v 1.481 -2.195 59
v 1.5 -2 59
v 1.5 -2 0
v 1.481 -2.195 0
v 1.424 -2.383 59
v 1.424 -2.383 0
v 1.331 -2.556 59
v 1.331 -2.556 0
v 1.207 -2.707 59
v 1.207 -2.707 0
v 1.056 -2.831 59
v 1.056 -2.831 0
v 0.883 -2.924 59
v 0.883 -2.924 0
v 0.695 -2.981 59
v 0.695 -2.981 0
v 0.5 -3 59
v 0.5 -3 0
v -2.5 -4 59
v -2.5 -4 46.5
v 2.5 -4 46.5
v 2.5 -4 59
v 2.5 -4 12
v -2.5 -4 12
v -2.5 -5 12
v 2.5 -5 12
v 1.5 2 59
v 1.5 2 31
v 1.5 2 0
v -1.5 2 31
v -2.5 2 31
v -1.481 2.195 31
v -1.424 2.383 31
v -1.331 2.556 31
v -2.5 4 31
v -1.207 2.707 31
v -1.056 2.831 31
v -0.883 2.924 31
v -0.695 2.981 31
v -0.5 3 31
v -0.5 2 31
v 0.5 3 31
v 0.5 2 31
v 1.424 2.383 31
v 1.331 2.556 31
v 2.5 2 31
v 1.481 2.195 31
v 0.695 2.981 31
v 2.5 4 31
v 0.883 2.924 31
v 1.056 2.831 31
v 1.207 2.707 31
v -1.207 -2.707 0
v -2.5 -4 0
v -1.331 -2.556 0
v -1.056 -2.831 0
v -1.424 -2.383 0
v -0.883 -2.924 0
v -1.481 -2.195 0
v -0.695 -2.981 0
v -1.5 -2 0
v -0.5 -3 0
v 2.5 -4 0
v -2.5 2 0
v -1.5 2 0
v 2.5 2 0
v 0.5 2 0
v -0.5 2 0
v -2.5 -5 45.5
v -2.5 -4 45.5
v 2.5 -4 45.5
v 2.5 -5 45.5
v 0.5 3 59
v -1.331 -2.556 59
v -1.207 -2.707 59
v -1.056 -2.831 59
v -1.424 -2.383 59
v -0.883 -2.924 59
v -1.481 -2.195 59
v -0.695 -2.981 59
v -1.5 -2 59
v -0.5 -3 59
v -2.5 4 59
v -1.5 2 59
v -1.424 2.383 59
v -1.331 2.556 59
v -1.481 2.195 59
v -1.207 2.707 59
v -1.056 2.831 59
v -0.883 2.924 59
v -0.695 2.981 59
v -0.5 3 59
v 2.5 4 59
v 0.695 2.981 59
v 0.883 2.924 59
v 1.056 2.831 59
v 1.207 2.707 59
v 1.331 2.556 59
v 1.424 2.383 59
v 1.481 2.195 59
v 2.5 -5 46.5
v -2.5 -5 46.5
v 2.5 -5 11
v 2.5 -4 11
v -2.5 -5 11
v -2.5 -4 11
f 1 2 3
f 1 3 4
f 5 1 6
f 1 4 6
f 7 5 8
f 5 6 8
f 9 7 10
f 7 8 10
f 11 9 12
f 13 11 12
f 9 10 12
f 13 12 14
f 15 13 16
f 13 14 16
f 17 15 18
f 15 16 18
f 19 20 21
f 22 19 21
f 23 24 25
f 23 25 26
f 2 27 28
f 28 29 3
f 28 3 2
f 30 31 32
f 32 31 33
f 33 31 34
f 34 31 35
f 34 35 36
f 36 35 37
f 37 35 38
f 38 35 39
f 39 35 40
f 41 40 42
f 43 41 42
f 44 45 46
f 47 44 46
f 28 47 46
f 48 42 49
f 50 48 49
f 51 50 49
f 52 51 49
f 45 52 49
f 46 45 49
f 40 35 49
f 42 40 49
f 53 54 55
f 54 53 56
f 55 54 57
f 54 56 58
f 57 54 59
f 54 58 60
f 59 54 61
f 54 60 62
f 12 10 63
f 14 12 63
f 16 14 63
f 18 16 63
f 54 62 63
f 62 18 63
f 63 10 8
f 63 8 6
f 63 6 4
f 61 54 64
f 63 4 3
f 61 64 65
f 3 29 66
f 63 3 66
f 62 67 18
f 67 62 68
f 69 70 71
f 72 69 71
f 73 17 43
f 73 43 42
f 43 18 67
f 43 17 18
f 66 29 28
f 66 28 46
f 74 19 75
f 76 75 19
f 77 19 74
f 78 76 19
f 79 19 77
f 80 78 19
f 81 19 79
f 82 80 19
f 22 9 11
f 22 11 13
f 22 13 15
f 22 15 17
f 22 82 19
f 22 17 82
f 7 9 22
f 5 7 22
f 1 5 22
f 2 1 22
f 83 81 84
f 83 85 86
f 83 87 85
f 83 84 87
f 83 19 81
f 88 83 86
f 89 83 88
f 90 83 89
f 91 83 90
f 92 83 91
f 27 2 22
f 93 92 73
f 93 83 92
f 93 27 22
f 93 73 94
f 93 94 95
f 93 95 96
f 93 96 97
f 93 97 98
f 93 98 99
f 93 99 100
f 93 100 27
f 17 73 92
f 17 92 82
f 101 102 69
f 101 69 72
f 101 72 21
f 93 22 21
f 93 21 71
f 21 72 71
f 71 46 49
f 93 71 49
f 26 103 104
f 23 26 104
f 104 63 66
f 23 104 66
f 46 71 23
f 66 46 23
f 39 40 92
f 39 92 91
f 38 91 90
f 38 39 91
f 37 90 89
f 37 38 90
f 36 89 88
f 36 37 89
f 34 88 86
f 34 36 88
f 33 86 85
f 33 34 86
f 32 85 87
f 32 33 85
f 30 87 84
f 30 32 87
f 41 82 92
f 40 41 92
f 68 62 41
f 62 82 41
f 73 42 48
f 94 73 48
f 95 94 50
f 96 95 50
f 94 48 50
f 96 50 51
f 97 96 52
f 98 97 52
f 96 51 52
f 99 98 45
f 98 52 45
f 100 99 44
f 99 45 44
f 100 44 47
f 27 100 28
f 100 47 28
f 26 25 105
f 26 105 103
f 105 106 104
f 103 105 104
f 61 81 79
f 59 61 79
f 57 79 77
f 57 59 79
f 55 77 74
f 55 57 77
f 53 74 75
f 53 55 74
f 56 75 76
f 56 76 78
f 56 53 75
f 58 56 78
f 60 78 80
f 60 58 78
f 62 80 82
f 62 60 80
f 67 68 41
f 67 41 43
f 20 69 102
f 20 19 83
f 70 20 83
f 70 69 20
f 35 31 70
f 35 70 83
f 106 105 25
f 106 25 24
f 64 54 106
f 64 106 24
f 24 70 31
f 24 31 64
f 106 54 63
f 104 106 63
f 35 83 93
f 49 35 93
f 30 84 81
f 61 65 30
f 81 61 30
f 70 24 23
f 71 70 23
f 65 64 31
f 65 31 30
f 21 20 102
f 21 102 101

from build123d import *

# Parameters (mm, degrees)
SKETCH1_W           = 5
SKETCH1_H           = 8
BOSS_EXTRUDE3_DEPTH = 59
SKETCH8_W           = 5
SKETCH8_H           = 1
BOSS_EXTRUDE5_DEPTH = 1
SKETCH10_W          = 5
SKETCH10_H          = 1
BOSS_EXTRUDE7_DEPTH = 1
SKETCH6_W           = 5
SKETCH6_H           = 31
CUT_EXTRUDE1_DEPTH  = 2


with BuildPart() as part:
    # Sketch1 → Boss-Extrude3 (new body)
    with BuildSketch(Plane.XY):
        Rectangle(SKETCH1_W, SKETCH1_H)
        with BuildLine():
            Line((-1.5, 2), (-1.5, -2))
            ThreePointArc((-1.5, -2), (-1.207106781, -2.707106781), (-0.5, -3))
            Line((-0.5, -3), (-0.5, 3))
            ThreePointArc((-0.5, 3), (-1.207106781, 2.707106781), (-1.5, 2))
        make_face(mode=Mode.SUBTRACT)
        with BuildLine():
            Line((1.5, 2), (1.5, -2))
            ThreePointArc((1.5, -2), (1.207106781, -2.707106781), (0.5, -3))
            Line((0.5, -3), (0.5, 3))
            ThreePointArc((0.5, 3), (1.207106781, 2.707106781), (1.5, 2))
        make_face(mode=Mode.SUBTRACT)
    extrude(amount=BOSS_EXTRUDE3_DEPTH)

    # Sketch8 → Boss-Extrude5 (add)
    with BuildSketch(Plane.XZ.offset(4)):
        with Locations((0, 11.5)):
            Rectangle(SKETCH8_W, SKETCH8_H)
    extrude(amount=BOSS_EXTRUDE5_DEPTH)

    # Sketch10 → Boss-Extrude7 (add)
    with BuildSketch(Plane.XZ.offset(4)):
        with Locations((0, 46)):
            Rectangle(SKETCH10_W, SKETCH10_H)
    extrude(amount=BOSS_EXTRUDE7_DEPTH)

    # Sketch6 → Cut-Extrude1 (cut)
    with BuildSketch(Plane(origin=(0, 4, 0), x_dir=(1, 0, 0), z_dir=(0, 1, 0))):
        with Locations((0, -15.5)):
            Rectangle(SKETCH6_W, SKETCH6_H)
    extrude(amount=-CUT_EXTRUDE1_DEPTH, mode=Mode.SUBTRACT)


solid = part.part
